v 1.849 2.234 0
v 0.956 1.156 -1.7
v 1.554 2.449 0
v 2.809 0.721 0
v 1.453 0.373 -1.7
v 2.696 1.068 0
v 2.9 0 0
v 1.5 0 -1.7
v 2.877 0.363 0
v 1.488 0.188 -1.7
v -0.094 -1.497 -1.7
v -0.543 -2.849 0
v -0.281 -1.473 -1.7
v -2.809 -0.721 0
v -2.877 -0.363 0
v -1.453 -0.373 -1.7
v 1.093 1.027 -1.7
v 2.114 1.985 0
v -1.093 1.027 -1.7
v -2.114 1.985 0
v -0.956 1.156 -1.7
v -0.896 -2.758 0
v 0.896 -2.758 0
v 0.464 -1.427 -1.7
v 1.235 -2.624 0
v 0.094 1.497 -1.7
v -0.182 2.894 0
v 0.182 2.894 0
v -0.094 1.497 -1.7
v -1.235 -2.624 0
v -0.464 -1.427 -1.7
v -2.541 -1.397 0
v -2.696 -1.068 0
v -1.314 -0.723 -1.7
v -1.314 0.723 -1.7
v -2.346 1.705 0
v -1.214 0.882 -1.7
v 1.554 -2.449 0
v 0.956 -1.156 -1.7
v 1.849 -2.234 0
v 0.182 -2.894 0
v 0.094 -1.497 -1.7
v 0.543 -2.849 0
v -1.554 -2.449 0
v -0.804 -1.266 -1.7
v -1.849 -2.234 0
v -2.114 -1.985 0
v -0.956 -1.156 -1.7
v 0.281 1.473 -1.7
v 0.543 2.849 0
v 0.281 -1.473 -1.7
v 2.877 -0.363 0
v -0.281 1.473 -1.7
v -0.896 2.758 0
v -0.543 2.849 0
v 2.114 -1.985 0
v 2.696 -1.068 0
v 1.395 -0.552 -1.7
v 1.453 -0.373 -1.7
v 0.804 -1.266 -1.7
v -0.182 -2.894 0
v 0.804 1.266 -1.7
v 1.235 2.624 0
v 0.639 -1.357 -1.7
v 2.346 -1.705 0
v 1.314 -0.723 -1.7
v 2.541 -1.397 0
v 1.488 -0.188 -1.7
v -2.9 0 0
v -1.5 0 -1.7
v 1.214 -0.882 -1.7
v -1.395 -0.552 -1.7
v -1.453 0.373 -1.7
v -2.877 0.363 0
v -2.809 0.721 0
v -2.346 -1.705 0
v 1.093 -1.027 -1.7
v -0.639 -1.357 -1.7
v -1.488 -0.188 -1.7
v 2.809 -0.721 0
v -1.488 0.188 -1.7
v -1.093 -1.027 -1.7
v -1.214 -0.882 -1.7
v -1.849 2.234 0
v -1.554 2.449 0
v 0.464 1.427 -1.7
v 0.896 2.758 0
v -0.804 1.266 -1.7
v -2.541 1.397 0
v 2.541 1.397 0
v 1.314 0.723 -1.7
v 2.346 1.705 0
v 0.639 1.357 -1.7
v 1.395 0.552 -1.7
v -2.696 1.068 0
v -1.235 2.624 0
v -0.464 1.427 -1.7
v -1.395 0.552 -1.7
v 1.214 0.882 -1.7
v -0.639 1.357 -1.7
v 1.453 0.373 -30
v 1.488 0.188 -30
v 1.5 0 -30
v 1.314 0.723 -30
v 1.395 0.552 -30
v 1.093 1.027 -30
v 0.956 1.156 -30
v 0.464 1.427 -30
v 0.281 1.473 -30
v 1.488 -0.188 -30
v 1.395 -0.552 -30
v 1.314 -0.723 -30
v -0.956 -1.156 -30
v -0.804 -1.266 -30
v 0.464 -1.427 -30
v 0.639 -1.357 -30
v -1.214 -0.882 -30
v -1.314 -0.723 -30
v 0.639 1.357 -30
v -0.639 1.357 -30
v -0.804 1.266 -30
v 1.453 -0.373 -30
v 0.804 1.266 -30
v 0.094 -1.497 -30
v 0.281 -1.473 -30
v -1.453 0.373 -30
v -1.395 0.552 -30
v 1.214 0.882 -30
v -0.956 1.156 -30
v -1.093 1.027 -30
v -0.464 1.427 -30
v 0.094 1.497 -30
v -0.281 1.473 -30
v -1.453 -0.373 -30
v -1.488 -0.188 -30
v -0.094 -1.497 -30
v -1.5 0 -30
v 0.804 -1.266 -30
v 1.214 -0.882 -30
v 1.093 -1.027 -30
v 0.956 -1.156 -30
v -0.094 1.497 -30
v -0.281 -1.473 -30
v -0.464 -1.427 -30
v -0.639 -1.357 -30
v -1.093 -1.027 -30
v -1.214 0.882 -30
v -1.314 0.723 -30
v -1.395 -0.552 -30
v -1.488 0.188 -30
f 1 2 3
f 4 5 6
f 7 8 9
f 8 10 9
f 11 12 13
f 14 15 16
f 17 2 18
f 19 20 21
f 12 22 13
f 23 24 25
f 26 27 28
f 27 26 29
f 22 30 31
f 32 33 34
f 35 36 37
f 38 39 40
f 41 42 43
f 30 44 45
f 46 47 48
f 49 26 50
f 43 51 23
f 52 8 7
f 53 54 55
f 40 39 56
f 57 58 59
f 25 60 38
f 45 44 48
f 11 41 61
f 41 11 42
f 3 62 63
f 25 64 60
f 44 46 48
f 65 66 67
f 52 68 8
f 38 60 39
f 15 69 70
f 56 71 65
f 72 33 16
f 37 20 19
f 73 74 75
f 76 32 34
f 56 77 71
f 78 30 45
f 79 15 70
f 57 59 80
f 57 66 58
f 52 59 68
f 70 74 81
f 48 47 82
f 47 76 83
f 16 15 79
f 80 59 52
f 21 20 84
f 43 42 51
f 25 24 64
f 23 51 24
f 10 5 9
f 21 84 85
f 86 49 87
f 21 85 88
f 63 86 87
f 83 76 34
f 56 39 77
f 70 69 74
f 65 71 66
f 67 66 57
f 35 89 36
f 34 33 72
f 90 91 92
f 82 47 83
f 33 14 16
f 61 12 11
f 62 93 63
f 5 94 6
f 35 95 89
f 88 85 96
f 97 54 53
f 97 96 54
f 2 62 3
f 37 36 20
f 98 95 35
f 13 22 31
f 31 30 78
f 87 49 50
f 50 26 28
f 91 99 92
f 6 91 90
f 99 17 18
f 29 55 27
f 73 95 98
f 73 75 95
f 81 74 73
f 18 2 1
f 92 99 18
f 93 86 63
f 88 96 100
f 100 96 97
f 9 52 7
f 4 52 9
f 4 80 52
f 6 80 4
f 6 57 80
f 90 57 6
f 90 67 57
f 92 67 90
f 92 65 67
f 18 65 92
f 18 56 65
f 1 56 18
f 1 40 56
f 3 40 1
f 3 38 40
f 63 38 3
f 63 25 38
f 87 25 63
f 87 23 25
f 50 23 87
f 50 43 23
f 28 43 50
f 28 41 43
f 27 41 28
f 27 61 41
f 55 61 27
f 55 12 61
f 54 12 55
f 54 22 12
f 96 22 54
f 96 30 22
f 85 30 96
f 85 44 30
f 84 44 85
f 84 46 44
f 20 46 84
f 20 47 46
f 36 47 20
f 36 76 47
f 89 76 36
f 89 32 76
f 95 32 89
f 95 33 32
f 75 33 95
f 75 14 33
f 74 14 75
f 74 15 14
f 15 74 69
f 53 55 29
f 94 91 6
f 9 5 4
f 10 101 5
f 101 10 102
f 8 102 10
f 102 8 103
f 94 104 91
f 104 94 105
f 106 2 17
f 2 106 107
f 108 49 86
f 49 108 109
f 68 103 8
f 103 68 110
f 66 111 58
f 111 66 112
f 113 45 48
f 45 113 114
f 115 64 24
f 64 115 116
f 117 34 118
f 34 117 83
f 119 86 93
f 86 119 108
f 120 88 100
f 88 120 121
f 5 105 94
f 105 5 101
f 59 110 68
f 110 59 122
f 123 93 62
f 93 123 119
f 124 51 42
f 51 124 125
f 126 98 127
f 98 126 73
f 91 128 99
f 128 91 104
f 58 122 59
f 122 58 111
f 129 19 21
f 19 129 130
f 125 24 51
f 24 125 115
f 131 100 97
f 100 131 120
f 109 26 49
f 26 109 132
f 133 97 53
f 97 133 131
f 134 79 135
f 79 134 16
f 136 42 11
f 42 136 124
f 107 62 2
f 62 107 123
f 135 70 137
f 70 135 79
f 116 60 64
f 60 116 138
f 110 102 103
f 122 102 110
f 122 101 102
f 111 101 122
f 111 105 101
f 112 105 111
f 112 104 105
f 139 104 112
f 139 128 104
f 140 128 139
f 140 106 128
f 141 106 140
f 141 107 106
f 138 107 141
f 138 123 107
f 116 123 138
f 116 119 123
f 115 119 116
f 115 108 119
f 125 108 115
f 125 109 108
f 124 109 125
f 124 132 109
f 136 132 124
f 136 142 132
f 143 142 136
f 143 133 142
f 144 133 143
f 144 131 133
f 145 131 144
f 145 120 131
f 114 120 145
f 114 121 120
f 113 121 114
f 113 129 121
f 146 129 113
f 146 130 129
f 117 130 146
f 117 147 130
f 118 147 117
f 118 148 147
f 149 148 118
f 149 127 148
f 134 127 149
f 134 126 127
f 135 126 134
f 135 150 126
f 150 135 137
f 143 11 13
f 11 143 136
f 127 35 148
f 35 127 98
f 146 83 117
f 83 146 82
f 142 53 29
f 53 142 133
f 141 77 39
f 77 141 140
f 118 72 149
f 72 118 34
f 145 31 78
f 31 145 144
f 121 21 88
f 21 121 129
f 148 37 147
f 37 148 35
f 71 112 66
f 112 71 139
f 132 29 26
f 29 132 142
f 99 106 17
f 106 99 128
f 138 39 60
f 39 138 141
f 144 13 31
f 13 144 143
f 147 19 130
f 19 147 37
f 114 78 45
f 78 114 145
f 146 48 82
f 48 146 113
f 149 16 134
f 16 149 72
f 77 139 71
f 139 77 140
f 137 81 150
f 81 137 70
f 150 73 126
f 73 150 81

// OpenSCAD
$fn = 50;


difference() {
	union() {
		translate(v = [0, 0, -1.7000000000]) {
			rotate(a = [0, 0, 0]) {
				cylinder(h = 1.7000000000, r1 = 1.5000000000, r2 = 2.9000000000);
			}
		}
		translate(v = [0, 0, -30]) {
			rotate(a = [0, 0, 0]) {
				cylinder(h = 30, r = 1.5000000000);
			}
		}
	}
	union();
}
